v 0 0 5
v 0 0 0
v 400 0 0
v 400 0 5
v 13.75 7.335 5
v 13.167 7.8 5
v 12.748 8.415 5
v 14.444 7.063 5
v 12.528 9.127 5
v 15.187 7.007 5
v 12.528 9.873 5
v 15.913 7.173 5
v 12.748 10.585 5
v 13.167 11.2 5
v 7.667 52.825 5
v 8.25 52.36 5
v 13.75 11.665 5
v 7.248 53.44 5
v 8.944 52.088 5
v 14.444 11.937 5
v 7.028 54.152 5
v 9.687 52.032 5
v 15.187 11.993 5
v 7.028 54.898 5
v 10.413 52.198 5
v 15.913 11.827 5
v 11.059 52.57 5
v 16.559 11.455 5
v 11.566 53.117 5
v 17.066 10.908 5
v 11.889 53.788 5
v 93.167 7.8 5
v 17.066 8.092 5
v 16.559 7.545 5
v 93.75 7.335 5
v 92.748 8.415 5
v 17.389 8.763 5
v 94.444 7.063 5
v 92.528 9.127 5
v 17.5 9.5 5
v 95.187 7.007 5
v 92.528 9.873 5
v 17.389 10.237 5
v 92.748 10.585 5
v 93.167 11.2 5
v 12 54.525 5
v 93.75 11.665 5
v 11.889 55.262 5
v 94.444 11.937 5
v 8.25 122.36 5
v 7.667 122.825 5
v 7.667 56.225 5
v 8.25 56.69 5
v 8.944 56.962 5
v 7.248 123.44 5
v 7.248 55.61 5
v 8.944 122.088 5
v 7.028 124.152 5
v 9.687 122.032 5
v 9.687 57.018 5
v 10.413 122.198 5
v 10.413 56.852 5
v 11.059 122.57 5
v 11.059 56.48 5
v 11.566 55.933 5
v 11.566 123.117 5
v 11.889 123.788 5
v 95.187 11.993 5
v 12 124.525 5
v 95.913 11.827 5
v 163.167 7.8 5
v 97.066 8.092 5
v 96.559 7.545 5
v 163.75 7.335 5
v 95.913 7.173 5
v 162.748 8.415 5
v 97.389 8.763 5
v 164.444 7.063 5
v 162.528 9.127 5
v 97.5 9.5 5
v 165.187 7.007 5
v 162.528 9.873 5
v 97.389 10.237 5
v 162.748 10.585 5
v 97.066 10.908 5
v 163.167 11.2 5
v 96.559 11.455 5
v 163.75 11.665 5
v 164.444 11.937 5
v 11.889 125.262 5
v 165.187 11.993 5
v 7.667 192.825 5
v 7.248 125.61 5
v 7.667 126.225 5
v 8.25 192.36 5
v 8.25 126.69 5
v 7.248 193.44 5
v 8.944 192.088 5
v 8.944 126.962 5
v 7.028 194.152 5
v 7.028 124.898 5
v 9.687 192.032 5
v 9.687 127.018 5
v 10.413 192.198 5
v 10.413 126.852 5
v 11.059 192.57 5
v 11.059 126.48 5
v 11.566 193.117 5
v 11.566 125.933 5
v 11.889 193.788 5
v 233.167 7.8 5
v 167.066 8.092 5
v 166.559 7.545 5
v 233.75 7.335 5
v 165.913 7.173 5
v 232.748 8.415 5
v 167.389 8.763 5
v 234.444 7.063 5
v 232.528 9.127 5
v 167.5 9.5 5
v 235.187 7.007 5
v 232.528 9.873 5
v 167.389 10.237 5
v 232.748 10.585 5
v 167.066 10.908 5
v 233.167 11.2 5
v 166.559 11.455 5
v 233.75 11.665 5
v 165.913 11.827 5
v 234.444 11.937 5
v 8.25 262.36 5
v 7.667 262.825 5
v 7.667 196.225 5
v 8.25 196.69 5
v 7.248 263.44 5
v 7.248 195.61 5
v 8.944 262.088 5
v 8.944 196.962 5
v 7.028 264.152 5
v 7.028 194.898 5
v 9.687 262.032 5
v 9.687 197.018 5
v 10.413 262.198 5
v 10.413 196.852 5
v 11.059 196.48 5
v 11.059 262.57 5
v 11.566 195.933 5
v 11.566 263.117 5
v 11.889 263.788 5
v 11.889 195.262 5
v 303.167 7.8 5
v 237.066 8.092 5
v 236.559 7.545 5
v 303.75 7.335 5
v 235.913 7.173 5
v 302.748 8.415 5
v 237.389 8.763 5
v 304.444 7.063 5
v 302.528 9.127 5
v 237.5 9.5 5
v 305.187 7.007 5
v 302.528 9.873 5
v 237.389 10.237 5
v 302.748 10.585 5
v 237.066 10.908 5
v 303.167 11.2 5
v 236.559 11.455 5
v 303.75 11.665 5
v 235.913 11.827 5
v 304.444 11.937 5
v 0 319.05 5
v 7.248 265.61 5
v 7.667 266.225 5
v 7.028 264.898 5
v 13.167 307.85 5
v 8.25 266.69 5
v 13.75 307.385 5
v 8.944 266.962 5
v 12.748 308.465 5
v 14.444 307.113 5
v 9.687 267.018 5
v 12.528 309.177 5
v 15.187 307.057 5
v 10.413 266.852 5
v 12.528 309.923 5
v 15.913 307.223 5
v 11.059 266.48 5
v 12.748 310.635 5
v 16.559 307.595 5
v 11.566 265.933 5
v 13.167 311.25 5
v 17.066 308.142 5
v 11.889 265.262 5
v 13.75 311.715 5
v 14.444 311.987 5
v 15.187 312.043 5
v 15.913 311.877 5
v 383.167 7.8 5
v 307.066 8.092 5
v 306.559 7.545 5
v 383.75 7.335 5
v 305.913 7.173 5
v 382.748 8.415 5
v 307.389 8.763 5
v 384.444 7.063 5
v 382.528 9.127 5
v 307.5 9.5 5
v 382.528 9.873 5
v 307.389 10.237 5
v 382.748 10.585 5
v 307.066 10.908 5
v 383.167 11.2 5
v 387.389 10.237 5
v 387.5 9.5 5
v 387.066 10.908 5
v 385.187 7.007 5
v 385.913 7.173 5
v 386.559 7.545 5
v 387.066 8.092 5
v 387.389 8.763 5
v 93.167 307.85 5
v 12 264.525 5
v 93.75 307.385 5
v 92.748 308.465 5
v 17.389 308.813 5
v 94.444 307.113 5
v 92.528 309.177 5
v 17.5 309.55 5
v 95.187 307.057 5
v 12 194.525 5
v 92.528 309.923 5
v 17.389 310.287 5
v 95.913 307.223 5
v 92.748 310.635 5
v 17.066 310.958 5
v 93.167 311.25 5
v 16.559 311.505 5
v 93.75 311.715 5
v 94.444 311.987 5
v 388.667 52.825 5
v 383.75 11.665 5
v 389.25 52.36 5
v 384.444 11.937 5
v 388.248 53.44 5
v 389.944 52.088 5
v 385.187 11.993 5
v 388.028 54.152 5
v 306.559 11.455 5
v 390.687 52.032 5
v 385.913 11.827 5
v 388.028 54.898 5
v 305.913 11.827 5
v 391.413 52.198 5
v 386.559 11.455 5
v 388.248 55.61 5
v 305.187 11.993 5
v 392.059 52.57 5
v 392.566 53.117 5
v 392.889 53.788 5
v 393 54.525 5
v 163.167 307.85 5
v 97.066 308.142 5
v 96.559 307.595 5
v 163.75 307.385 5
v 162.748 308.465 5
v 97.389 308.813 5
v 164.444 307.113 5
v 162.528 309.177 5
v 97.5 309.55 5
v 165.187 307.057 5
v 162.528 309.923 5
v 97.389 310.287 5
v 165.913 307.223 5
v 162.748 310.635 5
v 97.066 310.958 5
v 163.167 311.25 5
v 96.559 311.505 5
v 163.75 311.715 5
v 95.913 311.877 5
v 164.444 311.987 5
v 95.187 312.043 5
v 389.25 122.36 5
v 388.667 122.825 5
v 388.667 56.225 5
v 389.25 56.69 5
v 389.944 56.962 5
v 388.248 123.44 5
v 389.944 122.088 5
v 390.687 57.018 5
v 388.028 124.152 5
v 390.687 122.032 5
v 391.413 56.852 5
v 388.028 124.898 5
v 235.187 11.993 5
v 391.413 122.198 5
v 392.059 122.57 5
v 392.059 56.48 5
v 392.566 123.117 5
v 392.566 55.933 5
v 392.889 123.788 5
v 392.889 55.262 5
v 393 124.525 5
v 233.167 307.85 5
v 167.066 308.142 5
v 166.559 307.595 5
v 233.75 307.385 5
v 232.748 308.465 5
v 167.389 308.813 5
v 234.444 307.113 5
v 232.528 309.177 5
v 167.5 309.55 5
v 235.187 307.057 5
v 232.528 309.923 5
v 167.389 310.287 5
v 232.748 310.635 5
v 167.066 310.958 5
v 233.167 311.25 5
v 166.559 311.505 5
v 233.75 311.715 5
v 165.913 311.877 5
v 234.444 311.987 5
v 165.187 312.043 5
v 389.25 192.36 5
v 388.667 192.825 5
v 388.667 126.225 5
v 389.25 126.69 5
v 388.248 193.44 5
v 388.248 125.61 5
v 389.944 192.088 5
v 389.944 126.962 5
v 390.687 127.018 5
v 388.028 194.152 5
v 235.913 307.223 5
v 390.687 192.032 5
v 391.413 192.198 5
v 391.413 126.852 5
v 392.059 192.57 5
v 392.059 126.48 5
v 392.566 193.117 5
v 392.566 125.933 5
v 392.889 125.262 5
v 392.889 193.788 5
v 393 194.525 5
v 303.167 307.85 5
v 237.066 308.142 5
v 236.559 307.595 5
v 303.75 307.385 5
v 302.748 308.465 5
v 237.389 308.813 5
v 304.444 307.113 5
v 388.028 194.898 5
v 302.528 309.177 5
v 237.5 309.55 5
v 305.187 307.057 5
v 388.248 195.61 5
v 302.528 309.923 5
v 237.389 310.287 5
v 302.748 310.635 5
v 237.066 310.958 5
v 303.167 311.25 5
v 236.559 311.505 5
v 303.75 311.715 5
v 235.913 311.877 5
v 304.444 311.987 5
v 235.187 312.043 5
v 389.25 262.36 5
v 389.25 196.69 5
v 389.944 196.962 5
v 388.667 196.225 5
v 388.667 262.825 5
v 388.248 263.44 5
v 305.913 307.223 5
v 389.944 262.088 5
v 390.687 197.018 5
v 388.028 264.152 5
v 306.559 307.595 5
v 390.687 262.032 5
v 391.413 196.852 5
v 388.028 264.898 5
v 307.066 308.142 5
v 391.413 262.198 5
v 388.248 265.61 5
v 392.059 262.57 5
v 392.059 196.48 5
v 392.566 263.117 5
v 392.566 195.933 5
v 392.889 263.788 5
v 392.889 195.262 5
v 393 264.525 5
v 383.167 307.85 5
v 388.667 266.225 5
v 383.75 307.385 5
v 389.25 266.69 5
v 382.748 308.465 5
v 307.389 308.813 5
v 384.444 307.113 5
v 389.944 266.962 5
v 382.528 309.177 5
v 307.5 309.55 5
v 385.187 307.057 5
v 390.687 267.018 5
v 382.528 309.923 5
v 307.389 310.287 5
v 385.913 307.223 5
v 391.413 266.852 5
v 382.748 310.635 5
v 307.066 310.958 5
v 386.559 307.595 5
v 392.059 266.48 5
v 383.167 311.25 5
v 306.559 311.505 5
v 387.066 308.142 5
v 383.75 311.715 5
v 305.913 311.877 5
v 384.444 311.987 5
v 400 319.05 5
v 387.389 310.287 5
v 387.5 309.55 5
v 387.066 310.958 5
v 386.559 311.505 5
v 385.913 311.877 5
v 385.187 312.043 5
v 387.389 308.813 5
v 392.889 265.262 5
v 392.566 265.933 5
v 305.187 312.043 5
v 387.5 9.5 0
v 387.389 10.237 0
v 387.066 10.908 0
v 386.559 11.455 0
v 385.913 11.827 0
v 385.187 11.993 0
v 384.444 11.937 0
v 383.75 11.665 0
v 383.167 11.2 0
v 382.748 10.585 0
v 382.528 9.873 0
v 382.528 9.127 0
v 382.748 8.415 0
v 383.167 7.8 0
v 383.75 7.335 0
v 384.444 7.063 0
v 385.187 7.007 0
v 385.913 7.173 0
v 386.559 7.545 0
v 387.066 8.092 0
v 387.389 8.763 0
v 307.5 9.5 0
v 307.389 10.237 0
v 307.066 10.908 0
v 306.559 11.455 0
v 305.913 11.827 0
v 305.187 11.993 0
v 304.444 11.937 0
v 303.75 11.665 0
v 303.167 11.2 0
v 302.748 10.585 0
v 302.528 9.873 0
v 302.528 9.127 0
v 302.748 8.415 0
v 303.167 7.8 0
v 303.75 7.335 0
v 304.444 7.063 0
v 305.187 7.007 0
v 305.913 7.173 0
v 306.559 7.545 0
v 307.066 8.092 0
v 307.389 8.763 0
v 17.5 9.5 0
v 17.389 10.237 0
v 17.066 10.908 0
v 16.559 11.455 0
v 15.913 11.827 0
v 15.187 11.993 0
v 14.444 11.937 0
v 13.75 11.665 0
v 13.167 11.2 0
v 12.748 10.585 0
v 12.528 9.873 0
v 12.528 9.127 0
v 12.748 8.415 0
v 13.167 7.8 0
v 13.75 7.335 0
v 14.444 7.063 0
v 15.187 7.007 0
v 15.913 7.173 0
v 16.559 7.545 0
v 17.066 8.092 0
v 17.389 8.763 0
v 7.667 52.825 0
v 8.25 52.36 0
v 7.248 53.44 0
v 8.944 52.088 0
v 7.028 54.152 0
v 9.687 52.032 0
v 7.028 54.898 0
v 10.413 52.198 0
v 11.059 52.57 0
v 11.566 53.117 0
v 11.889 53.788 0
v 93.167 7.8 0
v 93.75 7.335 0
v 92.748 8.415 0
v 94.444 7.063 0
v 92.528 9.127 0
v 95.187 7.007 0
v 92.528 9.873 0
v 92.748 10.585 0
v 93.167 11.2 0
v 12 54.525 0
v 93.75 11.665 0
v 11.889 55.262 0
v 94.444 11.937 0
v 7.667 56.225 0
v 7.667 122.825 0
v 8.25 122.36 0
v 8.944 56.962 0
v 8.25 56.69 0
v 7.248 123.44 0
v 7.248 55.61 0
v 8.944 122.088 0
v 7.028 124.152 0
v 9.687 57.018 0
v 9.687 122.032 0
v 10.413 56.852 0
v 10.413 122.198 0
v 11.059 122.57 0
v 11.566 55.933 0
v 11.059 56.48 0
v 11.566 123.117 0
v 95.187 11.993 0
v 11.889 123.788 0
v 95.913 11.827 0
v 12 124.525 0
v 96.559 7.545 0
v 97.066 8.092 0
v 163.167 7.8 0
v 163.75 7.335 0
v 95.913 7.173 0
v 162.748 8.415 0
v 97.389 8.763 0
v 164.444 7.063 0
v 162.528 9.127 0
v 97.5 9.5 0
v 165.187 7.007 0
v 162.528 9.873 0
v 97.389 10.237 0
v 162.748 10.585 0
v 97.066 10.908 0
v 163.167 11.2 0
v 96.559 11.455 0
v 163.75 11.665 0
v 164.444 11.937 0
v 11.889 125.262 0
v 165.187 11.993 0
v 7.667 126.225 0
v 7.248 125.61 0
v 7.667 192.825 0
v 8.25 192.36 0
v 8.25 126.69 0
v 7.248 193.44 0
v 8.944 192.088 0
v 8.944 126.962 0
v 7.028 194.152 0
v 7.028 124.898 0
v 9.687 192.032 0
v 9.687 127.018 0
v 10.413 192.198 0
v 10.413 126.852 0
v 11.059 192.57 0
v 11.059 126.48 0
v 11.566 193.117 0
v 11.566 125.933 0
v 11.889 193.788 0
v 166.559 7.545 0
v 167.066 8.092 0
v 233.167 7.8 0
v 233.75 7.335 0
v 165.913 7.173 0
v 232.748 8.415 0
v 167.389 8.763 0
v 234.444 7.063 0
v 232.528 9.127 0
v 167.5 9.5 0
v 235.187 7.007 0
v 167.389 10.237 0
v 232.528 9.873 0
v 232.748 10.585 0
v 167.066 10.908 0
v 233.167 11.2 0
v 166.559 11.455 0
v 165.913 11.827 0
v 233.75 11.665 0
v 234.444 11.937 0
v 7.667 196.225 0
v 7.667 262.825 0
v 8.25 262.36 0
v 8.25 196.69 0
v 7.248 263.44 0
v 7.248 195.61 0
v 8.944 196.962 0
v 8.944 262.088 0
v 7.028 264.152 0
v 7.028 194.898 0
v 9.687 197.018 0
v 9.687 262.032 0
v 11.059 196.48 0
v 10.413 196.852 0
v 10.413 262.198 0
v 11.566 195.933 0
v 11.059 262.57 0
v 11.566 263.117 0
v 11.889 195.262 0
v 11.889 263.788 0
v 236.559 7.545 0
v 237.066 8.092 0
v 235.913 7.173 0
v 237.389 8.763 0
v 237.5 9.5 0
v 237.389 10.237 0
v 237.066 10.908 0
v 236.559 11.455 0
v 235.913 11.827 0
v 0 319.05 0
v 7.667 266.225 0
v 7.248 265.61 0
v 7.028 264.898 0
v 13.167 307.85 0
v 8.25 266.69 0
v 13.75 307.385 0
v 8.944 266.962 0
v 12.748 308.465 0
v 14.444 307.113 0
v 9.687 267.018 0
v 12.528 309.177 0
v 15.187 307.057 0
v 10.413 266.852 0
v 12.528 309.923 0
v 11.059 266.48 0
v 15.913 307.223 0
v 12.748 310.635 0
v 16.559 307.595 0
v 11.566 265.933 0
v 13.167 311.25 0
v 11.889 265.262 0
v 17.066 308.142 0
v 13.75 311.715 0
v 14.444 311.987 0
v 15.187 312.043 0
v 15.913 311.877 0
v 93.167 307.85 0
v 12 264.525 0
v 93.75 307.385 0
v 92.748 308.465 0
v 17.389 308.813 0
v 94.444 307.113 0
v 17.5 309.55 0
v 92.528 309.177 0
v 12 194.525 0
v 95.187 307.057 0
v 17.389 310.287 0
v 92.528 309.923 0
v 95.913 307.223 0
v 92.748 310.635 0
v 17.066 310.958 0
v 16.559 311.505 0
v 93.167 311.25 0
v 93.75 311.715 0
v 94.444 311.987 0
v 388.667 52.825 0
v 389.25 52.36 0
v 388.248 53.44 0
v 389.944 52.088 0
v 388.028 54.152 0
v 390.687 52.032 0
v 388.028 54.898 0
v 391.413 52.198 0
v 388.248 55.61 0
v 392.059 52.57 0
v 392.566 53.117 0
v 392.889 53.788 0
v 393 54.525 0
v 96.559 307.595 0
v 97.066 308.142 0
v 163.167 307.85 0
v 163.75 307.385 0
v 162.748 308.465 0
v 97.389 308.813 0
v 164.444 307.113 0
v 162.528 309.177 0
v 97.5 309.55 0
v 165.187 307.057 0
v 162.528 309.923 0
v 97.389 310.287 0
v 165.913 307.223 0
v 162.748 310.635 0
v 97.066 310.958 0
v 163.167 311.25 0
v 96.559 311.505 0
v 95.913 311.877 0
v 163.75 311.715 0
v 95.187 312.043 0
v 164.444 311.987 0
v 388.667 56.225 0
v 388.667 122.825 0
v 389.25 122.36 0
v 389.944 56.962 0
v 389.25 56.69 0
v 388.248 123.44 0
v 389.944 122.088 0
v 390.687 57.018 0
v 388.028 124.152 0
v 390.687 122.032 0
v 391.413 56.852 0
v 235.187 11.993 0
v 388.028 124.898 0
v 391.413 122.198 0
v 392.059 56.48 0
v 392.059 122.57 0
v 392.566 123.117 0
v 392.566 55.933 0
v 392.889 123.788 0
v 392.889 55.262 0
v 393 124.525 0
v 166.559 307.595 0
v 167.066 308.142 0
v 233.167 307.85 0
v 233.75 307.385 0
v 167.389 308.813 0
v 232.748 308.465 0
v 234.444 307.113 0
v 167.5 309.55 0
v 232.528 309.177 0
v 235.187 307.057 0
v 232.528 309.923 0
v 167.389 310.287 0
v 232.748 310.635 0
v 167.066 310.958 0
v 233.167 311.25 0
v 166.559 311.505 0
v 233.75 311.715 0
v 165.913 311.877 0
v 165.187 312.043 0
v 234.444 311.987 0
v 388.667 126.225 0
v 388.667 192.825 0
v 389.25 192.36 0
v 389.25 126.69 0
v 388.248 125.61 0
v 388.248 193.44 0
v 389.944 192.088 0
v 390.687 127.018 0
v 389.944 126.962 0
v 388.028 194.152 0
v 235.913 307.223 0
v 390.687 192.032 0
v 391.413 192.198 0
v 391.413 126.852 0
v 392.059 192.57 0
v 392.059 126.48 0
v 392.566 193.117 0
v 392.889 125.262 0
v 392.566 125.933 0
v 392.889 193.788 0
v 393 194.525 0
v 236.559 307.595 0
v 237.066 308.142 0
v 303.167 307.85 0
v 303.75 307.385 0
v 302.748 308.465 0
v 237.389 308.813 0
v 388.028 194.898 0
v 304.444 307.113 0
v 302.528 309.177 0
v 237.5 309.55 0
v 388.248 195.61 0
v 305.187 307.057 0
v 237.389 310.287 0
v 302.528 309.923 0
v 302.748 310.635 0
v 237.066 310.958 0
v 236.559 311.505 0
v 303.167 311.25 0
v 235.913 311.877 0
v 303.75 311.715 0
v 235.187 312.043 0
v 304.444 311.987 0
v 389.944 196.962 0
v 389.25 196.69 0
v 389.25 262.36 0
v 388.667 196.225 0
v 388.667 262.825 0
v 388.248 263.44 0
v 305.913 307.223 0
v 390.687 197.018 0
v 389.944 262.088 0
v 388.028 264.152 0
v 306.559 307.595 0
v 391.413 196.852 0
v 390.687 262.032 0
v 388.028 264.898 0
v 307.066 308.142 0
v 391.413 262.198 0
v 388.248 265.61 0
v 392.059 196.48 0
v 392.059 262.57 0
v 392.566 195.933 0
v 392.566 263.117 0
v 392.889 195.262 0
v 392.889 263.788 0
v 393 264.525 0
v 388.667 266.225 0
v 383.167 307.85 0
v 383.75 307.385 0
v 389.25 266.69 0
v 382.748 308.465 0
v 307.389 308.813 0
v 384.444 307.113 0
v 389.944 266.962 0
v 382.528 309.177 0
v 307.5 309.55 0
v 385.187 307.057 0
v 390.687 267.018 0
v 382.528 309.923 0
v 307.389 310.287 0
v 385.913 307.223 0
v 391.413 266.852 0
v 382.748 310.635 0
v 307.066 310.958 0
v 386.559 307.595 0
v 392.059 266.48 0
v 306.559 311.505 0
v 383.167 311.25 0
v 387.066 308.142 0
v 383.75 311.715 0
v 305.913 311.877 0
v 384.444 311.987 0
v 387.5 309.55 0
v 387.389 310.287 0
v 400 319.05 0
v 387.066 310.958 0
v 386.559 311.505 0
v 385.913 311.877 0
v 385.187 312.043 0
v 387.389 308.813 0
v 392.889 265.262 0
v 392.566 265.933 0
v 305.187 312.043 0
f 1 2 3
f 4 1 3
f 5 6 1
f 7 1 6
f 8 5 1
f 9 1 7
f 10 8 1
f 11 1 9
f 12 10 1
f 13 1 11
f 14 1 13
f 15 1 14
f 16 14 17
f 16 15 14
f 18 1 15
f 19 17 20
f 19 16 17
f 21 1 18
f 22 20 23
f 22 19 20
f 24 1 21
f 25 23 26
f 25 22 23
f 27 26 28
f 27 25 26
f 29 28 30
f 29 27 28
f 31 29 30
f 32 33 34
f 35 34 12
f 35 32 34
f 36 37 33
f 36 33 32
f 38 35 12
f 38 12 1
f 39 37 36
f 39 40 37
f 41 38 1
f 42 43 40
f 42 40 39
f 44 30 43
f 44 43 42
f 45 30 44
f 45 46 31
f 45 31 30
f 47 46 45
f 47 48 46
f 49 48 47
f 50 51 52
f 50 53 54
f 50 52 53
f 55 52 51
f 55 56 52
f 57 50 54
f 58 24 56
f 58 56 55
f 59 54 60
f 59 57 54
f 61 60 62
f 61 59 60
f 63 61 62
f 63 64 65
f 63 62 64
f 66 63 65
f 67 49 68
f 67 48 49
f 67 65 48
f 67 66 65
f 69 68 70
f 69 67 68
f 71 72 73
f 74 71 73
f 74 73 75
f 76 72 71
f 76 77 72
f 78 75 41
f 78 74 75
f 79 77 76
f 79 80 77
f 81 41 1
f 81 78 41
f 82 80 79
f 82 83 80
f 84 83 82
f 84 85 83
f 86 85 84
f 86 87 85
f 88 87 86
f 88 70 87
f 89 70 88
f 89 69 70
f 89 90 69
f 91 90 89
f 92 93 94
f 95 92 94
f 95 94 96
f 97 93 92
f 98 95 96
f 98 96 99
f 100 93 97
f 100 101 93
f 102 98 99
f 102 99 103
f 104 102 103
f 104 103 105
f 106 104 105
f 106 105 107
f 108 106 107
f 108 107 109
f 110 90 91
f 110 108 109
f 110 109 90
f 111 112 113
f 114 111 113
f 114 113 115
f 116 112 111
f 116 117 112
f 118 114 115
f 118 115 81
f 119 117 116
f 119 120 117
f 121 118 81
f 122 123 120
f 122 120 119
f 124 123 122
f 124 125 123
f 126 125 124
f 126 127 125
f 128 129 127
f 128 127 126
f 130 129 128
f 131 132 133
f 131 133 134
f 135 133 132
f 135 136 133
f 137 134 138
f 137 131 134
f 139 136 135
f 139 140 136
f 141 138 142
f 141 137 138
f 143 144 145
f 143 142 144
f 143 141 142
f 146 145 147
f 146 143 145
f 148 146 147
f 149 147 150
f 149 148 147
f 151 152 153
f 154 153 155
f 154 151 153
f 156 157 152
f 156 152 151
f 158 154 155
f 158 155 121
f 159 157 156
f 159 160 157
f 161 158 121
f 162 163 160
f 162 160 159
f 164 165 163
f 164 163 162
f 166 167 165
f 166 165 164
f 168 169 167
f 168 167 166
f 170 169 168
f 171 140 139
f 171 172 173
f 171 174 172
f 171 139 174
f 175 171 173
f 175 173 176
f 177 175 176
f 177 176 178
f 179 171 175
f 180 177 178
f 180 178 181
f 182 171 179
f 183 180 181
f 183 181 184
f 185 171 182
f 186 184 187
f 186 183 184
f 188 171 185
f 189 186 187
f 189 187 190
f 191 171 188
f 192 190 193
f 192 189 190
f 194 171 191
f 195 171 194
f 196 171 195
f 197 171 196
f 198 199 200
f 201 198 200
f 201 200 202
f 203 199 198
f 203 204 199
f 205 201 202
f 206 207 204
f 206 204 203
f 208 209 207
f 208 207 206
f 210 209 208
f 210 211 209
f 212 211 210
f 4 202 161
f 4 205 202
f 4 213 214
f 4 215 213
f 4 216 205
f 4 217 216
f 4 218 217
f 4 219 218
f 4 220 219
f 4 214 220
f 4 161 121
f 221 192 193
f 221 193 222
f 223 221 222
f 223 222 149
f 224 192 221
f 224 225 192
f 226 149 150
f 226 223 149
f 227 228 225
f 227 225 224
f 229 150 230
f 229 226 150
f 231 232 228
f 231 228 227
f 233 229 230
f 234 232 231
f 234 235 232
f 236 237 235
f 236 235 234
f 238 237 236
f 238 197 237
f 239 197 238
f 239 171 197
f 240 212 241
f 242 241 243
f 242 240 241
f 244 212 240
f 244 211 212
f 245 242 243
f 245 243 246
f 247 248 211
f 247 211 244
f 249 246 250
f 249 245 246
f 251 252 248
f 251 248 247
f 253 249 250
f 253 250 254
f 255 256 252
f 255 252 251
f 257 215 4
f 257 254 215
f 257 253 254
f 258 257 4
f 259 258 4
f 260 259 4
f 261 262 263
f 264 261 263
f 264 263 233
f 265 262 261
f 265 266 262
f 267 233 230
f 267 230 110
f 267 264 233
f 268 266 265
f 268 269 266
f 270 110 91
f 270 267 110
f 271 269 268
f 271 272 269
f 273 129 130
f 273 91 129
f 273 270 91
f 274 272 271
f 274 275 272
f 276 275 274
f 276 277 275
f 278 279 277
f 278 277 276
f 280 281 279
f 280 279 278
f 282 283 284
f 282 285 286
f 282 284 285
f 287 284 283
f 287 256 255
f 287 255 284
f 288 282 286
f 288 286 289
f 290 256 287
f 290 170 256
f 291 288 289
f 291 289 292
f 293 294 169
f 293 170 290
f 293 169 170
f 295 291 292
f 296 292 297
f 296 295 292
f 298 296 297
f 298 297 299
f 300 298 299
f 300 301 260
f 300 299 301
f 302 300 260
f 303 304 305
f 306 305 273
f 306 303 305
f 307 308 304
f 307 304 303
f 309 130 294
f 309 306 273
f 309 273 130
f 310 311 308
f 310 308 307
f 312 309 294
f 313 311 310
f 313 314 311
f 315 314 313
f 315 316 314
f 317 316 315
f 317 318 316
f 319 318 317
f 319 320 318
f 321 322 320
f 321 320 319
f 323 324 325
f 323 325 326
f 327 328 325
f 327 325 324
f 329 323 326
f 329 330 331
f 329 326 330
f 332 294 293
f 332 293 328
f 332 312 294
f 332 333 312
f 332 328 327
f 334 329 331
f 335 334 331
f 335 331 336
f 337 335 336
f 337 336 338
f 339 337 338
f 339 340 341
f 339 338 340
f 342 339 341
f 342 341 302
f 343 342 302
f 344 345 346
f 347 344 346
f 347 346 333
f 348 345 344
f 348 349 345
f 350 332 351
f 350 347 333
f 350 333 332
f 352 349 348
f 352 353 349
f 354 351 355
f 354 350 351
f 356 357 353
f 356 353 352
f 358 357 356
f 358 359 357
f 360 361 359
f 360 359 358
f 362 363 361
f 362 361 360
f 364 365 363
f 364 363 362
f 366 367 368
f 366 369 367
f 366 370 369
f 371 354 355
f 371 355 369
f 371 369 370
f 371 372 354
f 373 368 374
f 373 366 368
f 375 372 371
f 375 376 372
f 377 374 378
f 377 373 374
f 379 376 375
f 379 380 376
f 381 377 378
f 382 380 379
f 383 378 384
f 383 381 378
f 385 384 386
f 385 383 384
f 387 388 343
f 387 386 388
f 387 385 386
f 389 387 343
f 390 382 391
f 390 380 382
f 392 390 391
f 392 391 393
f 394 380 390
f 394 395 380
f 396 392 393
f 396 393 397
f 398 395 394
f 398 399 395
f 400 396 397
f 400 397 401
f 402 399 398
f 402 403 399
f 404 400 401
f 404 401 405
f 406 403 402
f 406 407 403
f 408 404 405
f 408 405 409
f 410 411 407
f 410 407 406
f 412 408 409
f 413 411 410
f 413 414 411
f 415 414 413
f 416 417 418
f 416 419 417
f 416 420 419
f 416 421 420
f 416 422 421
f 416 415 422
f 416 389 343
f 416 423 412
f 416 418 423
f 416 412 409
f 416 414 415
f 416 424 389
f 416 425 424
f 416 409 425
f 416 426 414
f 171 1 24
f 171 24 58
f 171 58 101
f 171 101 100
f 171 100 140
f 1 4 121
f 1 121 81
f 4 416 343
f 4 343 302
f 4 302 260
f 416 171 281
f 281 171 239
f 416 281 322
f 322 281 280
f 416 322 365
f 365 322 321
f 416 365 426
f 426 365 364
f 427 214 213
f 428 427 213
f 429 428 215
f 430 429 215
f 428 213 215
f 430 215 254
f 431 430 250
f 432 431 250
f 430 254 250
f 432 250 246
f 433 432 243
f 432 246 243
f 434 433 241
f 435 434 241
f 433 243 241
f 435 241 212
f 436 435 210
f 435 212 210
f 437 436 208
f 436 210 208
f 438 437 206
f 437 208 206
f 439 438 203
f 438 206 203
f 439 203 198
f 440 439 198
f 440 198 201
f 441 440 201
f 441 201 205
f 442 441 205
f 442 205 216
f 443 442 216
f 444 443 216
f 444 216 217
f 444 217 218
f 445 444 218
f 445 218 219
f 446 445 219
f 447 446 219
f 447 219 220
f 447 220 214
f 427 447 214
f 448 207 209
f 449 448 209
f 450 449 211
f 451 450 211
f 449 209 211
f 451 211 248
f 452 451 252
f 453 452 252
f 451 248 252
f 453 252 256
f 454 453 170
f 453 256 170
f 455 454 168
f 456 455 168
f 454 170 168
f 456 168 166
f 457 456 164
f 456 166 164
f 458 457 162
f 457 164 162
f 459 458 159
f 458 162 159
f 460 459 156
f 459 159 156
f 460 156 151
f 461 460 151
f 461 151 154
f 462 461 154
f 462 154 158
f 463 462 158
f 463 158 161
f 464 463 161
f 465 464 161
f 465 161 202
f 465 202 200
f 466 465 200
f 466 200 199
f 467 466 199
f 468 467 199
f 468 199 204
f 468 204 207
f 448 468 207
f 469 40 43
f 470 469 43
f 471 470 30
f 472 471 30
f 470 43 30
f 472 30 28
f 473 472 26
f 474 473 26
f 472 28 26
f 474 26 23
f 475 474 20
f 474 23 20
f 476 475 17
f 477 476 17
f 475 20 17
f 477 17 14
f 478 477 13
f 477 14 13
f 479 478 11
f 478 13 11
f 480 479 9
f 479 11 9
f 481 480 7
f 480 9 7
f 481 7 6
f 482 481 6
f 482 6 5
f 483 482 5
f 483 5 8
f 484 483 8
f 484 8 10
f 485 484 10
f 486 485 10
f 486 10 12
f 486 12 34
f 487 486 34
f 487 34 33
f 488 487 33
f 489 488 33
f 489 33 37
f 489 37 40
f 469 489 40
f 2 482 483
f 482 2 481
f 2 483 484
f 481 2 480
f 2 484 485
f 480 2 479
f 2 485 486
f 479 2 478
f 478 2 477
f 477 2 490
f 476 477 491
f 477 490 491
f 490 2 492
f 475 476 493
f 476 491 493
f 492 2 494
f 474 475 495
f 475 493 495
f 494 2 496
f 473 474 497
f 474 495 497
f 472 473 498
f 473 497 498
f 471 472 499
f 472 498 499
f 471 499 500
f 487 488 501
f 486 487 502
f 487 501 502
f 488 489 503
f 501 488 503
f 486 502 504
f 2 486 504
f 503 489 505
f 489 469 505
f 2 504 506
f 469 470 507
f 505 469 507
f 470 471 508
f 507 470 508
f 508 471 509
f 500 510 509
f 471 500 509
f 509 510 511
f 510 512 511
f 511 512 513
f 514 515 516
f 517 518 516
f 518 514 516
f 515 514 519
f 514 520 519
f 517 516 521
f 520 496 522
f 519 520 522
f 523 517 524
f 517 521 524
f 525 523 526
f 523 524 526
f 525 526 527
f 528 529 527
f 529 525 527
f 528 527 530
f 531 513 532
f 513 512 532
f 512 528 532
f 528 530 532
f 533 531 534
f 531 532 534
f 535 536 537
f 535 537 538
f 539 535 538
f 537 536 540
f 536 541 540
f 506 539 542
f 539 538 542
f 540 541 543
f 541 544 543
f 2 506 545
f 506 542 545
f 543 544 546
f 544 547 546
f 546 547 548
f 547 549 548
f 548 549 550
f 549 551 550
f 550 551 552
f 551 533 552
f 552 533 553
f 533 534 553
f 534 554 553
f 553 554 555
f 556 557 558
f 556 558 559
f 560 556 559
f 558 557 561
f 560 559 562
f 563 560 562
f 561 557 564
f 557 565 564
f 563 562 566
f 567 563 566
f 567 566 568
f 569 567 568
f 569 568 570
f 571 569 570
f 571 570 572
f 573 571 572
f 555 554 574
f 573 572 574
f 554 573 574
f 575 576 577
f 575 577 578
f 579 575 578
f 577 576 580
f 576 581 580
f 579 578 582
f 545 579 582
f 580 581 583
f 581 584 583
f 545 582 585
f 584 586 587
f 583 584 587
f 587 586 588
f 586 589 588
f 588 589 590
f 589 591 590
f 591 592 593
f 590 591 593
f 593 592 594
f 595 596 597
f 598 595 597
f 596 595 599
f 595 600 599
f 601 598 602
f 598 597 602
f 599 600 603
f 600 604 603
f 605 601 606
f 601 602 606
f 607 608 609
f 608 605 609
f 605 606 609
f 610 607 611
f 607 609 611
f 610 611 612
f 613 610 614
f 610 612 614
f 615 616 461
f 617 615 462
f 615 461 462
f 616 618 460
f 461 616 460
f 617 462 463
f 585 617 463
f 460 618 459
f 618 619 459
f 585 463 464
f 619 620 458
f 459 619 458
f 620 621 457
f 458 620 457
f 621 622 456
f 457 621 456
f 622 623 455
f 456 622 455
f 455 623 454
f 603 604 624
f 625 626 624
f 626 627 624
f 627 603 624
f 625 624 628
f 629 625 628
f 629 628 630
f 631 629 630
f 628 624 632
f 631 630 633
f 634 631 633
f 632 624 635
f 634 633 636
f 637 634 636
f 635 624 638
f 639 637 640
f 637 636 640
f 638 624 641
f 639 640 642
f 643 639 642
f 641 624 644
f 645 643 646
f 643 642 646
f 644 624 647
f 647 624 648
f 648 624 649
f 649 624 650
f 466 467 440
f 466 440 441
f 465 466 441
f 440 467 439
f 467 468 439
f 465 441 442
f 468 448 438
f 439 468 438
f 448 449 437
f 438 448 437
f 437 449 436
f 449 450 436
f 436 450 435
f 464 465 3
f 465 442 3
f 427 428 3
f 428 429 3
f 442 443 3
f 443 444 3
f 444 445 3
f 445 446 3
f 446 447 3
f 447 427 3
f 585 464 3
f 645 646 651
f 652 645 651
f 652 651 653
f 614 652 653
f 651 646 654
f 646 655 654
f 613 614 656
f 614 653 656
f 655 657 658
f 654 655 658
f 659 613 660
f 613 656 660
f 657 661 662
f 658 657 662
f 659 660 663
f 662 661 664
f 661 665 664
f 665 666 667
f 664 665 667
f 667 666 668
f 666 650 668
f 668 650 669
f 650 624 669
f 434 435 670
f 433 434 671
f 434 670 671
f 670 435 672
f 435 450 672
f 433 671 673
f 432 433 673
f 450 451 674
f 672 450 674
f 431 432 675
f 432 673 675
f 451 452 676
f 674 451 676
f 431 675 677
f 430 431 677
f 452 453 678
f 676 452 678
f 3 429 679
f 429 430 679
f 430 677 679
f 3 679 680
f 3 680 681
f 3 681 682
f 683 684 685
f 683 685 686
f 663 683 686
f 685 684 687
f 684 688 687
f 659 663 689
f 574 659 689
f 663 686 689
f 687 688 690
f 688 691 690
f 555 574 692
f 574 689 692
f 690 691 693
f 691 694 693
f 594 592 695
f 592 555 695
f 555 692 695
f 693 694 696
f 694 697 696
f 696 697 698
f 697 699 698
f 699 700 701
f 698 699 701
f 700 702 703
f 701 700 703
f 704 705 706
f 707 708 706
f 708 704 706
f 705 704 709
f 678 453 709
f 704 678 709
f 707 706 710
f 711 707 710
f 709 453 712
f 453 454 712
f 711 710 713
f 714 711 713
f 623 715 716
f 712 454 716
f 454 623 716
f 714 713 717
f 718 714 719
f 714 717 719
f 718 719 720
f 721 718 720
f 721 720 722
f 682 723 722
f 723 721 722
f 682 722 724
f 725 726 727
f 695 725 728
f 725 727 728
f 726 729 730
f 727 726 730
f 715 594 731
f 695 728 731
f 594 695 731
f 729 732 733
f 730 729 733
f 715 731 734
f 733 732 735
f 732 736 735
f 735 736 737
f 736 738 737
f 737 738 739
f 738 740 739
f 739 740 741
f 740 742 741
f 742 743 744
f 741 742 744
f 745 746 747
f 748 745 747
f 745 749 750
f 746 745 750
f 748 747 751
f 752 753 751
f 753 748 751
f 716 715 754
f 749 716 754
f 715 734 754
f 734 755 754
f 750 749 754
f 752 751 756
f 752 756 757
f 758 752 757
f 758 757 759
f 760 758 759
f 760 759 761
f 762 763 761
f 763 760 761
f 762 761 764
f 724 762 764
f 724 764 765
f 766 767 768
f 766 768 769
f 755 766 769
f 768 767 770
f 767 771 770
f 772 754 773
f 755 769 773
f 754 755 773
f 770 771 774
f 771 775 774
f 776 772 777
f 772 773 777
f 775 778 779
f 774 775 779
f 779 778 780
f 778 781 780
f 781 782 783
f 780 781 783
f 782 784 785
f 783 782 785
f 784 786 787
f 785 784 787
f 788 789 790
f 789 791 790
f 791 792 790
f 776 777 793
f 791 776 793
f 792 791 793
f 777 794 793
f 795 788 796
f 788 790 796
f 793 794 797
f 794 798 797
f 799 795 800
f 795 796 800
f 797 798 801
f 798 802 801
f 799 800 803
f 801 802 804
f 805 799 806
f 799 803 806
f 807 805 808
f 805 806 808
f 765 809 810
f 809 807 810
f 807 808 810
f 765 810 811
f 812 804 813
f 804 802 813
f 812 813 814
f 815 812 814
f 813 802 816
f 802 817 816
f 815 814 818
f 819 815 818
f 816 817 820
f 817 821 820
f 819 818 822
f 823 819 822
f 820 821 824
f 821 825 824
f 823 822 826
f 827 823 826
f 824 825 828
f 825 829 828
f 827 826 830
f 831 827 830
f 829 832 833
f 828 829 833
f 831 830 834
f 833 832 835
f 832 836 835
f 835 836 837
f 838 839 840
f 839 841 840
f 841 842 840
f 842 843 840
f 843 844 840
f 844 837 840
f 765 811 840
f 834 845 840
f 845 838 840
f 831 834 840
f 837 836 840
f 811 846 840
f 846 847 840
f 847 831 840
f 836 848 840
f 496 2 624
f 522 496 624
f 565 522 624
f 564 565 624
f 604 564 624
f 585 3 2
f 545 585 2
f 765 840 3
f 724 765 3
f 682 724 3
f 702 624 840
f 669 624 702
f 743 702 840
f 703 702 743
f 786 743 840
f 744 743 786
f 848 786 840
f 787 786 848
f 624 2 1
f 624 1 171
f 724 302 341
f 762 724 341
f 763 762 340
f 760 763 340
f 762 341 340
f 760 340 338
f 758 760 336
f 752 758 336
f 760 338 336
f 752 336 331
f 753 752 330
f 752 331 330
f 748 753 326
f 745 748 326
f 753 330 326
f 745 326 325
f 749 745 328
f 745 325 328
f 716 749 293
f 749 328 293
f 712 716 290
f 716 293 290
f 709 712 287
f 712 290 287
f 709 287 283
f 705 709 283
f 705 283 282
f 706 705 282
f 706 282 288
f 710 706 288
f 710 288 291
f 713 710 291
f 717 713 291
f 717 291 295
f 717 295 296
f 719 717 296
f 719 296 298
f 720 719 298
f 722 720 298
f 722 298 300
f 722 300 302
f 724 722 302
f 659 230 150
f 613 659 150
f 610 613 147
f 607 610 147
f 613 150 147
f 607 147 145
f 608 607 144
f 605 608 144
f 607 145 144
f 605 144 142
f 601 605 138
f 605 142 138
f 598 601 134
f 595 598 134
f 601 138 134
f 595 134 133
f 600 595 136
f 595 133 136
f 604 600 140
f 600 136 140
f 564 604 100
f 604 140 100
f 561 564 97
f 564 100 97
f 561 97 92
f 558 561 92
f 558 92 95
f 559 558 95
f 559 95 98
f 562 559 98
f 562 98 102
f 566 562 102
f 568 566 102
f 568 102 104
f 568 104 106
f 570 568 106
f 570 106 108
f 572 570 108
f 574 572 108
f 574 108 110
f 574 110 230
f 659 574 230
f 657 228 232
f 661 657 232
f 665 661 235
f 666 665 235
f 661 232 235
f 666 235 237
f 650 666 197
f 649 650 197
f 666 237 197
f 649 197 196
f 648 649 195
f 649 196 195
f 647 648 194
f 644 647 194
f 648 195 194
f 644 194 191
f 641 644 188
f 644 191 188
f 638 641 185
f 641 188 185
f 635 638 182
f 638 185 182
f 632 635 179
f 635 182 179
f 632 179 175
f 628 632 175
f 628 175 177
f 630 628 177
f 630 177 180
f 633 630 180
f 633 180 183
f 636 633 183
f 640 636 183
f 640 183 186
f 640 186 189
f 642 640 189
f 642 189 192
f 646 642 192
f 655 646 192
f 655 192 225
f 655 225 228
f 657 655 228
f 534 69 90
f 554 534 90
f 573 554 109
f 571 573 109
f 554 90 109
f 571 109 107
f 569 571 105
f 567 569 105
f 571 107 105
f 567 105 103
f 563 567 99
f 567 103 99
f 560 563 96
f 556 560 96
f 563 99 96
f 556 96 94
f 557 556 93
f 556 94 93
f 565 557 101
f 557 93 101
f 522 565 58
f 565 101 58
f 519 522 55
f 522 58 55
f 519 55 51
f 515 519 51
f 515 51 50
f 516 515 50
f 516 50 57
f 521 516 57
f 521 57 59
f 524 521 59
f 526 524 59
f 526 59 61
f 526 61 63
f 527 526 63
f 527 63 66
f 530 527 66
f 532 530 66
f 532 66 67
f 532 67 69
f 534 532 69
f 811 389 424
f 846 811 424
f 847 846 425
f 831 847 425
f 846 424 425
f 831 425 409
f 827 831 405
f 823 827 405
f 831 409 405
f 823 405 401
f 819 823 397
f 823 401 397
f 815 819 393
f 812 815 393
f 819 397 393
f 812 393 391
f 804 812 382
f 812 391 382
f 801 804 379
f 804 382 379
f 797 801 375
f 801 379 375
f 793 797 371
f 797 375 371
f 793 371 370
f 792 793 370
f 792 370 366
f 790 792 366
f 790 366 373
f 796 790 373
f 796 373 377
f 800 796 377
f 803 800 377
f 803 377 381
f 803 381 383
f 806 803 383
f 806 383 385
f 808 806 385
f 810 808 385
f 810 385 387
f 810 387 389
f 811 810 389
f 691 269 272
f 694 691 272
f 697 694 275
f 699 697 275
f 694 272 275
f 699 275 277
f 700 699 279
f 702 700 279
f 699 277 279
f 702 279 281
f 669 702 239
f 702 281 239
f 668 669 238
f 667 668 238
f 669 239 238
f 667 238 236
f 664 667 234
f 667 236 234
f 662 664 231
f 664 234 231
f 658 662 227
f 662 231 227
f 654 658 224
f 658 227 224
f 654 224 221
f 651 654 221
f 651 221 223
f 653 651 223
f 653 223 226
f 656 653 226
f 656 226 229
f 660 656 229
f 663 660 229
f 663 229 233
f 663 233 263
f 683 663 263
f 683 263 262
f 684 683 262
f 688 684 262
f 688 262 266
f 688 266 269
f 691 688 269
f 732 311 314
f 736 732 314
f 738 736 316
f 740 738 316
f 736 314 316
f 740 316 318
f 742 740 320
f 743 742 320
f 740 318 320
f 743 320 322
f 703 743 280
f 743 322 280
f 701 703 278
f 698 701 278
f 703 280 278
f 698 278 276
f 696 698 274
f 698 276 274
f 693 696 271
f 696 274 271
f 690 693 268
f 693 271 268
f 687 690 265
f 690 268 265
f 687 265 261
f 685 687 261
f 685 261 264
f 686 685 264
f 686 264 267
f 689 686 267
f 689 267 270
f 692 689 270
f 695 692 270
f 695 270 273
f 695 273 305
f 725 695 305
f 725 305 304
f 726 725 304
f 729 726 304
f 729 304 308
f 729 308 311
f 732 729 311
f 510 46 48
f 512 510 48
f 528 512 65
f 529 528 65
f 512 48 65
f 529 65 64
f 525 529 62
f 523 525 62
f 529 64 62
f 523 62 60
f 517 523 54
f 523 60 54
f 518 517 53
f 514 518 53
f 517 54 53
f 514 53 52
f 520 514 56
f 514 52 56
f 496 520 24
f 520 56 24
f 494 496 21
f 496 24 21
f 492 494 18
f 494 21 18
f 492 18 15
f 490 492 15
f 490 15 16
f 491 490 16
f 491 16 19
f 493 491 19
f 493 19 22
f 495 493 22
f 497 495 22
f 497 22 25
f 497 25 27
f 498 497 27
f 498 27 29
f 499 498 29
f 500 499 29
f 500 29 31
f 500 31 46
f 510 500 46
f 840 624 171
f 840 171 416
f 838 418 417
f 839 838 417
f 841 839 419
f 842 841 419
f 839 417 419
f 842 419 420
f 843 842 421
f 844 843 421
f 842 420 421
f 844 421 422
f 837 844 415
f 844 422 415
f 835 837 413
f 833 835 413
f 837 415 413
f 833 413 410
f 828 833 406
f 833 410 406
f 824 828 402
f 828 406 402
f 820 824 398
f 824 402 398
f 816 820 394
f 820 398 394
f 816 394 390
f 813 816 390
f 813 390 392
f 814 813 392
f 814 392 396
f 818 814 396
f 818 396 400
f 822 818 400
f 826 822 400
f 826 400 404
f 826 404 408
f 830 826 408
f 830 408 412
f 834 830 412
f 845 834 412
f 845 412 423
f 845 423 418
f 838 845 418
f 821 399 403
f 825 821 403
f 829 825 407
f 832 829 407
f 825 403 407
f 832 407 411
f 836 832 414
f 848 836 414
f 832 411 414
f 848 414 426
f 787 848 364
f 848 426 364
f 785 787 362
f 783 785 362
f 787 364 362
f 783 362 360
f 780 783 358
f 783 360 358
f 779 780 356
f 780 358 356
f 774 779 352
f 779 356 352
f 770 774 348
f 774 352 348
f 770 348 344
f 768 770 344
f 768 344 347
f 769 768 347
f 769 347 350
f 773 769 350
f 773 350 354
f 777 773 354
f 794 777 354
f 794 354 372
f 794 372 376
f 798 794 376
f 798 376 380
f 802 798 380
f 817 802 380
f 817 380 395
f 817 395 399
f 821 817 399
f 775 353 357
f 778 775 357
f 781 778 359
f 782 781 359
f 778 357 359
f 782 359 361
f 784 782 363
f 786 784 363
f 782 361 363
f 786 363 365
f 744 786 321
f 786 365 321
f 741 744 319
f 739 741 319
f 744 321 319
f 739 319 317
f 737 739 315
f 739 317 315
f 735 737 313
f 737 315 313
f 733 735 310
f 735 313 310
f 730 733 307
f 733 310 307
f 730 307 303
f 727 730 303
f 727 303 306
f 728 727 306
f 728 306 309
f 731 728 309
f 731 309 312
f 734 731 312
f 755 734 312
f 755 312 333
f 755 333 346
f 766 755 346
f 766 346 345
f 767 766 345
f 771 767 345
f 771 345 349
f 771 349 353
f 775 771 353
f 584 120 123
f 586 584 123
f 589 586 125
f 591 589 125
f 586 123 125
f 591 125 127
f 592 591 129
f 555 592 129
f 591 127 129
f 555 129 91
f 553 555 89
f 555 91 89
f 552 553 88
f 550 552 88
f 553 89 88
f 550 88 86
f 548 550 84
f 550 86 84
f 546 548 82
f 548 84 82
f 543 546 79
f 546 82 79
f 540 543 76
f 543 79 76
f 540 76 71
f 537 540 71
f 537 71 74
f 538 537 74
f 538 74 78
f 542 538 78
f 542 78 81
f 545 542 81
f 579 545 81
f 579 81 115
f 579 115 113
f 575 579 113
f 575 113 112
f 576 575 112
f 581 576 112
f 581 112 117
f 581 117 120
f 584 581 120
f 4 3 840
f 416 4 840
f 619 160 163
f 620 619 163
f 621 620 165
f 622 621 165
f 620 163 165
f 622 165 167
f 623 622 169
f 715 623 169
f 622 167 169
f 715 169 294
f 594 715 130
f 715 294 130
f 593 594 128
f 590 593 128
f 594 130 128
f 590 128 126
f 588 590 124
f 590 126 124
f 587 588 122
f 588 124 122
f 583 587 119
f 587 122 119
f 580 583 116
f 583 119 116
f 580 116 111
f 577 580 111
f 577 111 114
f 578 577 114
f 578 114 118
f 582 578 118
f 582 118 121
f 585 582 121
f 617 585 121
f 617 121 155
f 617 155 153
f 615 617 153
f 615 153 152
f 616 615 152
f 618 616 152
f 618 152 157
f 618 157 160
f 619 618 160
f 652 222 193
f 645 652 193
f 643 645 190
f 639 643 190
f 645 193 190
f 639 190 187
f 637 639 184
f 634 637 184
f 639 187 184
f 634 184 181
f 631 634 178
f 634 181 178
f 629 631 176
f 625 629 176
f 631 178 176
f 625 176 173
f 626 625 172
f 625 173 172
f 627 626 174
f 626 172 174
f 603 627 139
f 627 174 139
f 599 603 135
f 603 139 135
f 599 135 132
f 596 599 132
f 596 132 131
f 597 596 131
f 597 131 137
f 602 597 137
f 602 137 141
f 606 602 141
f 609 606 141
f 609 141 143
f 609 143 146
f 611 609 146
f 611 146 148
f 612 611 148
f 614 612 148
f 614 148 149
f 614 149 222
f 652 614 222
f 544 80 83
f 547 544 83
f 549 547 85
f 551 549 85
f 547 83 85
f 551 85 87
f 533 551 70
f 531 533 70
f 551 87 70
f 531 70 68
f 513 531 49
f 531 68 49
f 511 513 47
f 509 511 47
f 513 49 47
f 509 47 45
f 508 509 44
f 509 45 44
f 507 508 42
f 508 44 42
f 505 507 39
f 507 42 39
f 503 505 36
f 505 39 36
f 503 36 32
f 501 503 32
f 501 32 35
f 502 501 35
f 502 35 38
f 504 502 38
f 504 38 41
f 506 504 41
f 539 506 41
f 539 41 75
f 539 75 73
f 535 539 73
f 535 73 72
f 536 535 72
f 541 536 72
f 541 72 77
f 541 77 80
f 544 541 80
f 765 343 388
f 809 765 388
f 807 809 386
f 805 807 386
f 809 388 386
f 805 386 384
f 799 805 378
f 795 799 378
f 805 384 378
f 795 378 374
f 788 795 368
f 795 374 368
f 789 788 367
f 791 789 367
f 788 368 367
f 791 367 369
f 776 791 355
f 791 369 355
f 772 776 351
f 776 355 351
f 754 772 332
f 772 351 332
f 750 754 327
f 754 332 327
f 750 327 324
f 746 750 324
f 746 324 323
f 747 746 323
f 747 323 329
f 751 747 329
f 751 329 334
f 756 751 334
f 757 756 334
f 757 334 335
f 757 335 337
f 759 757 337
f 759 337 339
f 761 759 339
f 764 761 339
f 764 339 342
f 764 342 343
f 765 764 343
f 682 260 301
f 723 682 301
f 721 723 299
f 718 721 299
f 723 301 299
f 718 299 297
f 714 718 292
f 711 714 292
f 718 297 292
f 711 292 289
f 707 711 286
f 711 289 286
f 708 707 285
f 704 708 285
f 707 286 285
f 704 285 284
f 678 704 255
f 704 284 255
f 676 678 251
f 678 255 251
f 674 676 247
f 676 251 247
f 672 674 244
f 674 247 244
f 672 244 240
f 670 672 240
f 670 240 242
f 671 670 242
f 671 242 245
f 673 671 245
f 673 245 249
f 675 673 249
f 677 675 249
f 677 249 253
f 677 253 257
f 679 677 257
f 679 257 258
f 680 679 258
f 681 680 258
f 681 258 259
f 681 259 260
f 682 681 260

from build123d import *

# Parameters (mm, degrees)
SKETCH1_W           = 400
SKETCH1_H           = 319.05
BOSS_EXTRUDE1_DEPTH = 5
SKETCH2_R           = 2.5
CUT_EXTRUDE1_DEPTH  = 10
SKETCH3_R           = 2.5
CUT_EXTRUDE2_DEPTH  = 6


with BuildPart() as part:
    # Sketch1 → Boss-Extrude1 (new body)
    with BuildSketch(Plane.XY):
        with Locations((200, 159.525)):
            Rectangle(SKETCH1_W, SKETCH1_H)
    extrude(amount=BOSS_EXTRUDE1_DEPTH)

    # Sketch2 → Cut-Extrude1 (cut)
    with BuildSketch(Plane.XY.offset(5)):
        with Locations((15, 9.5)):
            Circle(SKETCH2_R)
        with Locations((95, 9.5)):
            Circle(SKETCH2_R)
        with Locations((165, 9.5)):
            Circle(SKETCH2_R)
        with Locations((235, 9.5)):
            Circle(SKETCH2_R)
        with Locations((305, 9.5)):
            Circle(SKETCH2_R)
        with Locations((385, 9.5)):
            Circle(SKETCH2_R)
        with Locations((385, 309.55)):
            Circle(SKETCH2_R)
        with Locations((305, 309.55)):
            Circle(SKETCH2_R)
        with Locations((235, 309.55)):
            Circle(SKETCH2_R)
        with Locations((165, 309.55)):
            Circle(SKETCH2_R)
        with Locations((95, 309.55)):
            Circle(SKETCH2_R)
        with Locations((15, 309.55)):
            Circle(SKETCH2_R)
    extrude(amount=-CUT_EXTRUDE1_DEPTH, mode=Mode.SUBTRACT)

    # Sketch3 → Cut-Extrude2 (cut, through all)
    with BuildSketch(Plane.XY.offset(5)):
        with Locations((9.5, 264.525)):
            Circle(SKETCH3_R)
        with Locations((9.5, 194.525)):
            Circle(SKETCH3_R)
        with Locations((9.5, 124.525)):
            Circle(SKETCH3_R)
        with Locations((9.5, 54.525)):
            Circle(SKETCH3_R)
        with Locations((390.5, 54.525)):
            Circle(SKETCH3_R)
        with Locations((390.5, 124.525)):
            Circle(SKETCH3_R)
        with Locations((390.5, 194.525)):
            Circle(SKETCH3_R)
        with Locations((390.5, 264.525)):
            Circle(SKETCH3_R)
    extrude(amount=-CUT_EXTRUDE2_DEPTH, mode=Mode.SUBTRACT)


solid = part.part
